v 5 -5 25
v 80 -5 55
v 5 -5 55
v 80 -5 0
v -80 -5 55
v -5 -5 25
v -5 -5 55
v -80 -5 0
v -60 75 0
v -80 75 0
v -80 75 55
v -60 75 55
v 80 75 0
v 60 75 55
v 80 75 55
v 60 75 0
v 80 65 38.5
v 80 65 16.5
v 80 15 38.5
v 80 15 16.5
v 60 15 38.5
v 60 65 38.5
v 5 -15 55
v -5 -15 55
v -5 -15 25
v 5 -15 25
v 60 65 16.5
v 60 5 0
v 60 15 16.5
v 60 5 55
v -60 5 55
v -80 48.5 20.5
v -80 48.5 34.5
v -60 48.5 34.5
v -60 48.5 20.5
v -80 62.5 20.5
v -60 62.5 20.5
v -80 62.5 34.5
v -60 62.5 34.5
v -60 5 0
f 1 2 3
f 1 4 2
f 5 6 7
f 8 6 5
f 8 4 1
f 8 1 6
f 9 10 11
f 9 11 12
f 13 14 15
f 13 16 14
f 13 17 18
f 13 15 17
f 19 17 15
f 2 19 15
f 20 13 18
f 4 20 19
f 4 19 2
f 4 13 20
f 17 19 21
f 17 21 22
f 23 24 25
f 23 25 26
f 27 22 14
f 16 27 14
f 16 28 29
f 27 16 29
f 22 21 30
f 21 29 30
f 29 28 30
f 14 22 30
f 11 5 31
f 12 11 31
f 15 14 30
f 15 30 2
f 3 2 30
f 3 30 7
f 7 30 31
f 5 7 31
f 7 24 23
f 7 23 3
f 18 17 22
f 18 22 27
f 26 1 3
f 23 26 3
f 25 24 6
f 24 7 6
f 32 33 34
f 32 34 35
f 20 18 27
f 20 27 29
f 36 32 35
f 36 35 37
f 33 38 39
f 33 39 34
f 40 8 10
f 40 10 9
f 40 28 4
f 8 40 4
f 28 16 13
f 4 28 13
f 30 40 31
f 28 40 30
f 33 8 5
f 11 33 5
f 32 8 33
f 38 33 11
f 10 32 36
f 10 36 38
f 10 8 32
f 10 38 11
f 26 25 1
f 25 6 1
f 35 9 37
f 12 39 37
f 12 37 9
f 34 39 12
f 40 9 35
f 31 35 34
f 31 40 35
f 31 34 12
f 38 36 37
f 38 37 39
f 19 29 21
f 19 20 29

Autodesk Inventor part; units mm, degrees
ref_plane "YZ Plane" through (0, 0, 0) normal (1, 0, 0) x (0, 1, 0)
ref_plane "XZ Plane" through (0, 0, 0) normal (0, 1, 0) x (-1, 0, 0)
ref_plane "XY Plane" through (0, 0, 0) normal (0, 0, 1) x (1, 0, 0)
sketch "Boceto1" plane through (0, 0, 0) normal (0, 0, 1) x (1, 0, 0)
  line L0 (-80, 5) -> (80, 5)
  line L1 (80, 5) -> (80, -5)
  line L2 (80, -5) -> (-80, -5)
  line L3 (-80, -5) -> (-80, 5)
  line L4 (-80, 5) -> (80, -5) construction
  line L5 (80, 5) -> (-80, -5) construction
  point P0 (0, 0)
  dimension "d0" = 160
  dimension "d1" = 10
extrude "Extrusión1" add sketch "Boceto1" along normal blind 55
sketch "Boceto2" plane through (-80, 5, 0) normal (0, 1, 0) x (1, 0, 0)
  line L0 (0, 0) -> (0, -55) projected
  line L1 (0, -55) -> (160, -55) projected
  line L2 (0, 0) -> (20, 0)
  line L3 (20, 0) -> (20, -55)
  line L4 (20, -55) -> (0, -55)
  line L5 (0, -55) -> (0, 0)
  line L6 (160, 0) -> (160, -55) projected
  line L7 (160, 0) -> (140, 0)
  line L8 (140, 0) -> (140, -55)
  line L9 (140, -55) -> (160, -55)
  line L10 (160, -55) -> (160, 0)
  point P0 (80, 0)
  dimension "d4" = 20
  dimension "d5" = 20
extrude "Extrusión2" add sketch "Boceto2" along normal blind 70
sketch "Boceto3" plane through (-80, -5, 0) normal (-1, 0, 0) x (0, 0, 1)
  line L0 (0, 80) -> (55, 80) projected
  line L1 (20.5, 67.5) -> (34.5, 67.5)
  line L2 (34.5, 67.5) -> (34.5, 53.5)
  line L3 (34.5, 53.5) -> (20.5, 53.5)
  line L4 (20.5, 53.5) -> (20.5, 67.5)
  line L5 (20.5, 67.5) -> (34.5, 53.5) construction
  line L6 (34.5, 67.5) -> (20.5, 53.5) construction
  line L7 (0, 0) -> (0, 80) projected
  point P0 (0, 5)
  point P1 (27.5, 60.5)
  dimension "d10" = 14
  dimension "d11" = 14
  dimension "d12" = 20.5
  dimension "d13" = 12.5
extrude "Extrusión3" cut sketch "Boceto3" against normal blind 70
sketch "Boceto4" plane through (-80, -5, 0) normal (0, -1, 0) x (1, 0, 0)
  line L0 (140, 55) -> (20, 55) projected
  line L1 (75, 25) -> (85, 25)
  line L2 (85, 25) -> (85, 55)
  line L3 (85, 55) -> (75, 55)
  line L4 (75, 55) -> (75, 25)
  line L5 (75, 25) -> (85, 55) construction
  line L6 (85, 25) -> (75, 55) construction
  point P0 (80, 0)
  dimension "d17" = 10
  dimension "d30" = 30
extrude "Extrusión4" add sketch "Boceto4" along normal blind 10
sketch "Boceto5" plane through (80, -5, 55) normal (1, 0, 0) x (0, 0, -1)
  line L0 (0, 80) -> (55, 80) projected
  line L1 (55, 0) -> (55, 80) projected
  line L2 (16.5, 20) -> (16.5, 70)
  line L3 (16.5, 70) -> (38.5, 70)
  line L4 (38.5, 70) -> (38.5, 20)
  line L5 (38.5, 20) -> (16.5, 20)
  line L6 (16.5, 20) -> (38.5, 70) construction
  line L7 (16.5, 70) -> (38.5, 20) construction
  line L8 (0, 0) -> (0, 80) projected
  point P0 (55, 5)
  point P1 (27.5, 45)
  point P2 (16.5, 45)
  dimension "d26" = 50
  dimension "d27" = 22
  dimension "d28" = 16.5
  dimension "d29" = 10
extrude "Extrusión5" cut sketch "Boceto5" against normal blind 30
properties part number "camera_support"
